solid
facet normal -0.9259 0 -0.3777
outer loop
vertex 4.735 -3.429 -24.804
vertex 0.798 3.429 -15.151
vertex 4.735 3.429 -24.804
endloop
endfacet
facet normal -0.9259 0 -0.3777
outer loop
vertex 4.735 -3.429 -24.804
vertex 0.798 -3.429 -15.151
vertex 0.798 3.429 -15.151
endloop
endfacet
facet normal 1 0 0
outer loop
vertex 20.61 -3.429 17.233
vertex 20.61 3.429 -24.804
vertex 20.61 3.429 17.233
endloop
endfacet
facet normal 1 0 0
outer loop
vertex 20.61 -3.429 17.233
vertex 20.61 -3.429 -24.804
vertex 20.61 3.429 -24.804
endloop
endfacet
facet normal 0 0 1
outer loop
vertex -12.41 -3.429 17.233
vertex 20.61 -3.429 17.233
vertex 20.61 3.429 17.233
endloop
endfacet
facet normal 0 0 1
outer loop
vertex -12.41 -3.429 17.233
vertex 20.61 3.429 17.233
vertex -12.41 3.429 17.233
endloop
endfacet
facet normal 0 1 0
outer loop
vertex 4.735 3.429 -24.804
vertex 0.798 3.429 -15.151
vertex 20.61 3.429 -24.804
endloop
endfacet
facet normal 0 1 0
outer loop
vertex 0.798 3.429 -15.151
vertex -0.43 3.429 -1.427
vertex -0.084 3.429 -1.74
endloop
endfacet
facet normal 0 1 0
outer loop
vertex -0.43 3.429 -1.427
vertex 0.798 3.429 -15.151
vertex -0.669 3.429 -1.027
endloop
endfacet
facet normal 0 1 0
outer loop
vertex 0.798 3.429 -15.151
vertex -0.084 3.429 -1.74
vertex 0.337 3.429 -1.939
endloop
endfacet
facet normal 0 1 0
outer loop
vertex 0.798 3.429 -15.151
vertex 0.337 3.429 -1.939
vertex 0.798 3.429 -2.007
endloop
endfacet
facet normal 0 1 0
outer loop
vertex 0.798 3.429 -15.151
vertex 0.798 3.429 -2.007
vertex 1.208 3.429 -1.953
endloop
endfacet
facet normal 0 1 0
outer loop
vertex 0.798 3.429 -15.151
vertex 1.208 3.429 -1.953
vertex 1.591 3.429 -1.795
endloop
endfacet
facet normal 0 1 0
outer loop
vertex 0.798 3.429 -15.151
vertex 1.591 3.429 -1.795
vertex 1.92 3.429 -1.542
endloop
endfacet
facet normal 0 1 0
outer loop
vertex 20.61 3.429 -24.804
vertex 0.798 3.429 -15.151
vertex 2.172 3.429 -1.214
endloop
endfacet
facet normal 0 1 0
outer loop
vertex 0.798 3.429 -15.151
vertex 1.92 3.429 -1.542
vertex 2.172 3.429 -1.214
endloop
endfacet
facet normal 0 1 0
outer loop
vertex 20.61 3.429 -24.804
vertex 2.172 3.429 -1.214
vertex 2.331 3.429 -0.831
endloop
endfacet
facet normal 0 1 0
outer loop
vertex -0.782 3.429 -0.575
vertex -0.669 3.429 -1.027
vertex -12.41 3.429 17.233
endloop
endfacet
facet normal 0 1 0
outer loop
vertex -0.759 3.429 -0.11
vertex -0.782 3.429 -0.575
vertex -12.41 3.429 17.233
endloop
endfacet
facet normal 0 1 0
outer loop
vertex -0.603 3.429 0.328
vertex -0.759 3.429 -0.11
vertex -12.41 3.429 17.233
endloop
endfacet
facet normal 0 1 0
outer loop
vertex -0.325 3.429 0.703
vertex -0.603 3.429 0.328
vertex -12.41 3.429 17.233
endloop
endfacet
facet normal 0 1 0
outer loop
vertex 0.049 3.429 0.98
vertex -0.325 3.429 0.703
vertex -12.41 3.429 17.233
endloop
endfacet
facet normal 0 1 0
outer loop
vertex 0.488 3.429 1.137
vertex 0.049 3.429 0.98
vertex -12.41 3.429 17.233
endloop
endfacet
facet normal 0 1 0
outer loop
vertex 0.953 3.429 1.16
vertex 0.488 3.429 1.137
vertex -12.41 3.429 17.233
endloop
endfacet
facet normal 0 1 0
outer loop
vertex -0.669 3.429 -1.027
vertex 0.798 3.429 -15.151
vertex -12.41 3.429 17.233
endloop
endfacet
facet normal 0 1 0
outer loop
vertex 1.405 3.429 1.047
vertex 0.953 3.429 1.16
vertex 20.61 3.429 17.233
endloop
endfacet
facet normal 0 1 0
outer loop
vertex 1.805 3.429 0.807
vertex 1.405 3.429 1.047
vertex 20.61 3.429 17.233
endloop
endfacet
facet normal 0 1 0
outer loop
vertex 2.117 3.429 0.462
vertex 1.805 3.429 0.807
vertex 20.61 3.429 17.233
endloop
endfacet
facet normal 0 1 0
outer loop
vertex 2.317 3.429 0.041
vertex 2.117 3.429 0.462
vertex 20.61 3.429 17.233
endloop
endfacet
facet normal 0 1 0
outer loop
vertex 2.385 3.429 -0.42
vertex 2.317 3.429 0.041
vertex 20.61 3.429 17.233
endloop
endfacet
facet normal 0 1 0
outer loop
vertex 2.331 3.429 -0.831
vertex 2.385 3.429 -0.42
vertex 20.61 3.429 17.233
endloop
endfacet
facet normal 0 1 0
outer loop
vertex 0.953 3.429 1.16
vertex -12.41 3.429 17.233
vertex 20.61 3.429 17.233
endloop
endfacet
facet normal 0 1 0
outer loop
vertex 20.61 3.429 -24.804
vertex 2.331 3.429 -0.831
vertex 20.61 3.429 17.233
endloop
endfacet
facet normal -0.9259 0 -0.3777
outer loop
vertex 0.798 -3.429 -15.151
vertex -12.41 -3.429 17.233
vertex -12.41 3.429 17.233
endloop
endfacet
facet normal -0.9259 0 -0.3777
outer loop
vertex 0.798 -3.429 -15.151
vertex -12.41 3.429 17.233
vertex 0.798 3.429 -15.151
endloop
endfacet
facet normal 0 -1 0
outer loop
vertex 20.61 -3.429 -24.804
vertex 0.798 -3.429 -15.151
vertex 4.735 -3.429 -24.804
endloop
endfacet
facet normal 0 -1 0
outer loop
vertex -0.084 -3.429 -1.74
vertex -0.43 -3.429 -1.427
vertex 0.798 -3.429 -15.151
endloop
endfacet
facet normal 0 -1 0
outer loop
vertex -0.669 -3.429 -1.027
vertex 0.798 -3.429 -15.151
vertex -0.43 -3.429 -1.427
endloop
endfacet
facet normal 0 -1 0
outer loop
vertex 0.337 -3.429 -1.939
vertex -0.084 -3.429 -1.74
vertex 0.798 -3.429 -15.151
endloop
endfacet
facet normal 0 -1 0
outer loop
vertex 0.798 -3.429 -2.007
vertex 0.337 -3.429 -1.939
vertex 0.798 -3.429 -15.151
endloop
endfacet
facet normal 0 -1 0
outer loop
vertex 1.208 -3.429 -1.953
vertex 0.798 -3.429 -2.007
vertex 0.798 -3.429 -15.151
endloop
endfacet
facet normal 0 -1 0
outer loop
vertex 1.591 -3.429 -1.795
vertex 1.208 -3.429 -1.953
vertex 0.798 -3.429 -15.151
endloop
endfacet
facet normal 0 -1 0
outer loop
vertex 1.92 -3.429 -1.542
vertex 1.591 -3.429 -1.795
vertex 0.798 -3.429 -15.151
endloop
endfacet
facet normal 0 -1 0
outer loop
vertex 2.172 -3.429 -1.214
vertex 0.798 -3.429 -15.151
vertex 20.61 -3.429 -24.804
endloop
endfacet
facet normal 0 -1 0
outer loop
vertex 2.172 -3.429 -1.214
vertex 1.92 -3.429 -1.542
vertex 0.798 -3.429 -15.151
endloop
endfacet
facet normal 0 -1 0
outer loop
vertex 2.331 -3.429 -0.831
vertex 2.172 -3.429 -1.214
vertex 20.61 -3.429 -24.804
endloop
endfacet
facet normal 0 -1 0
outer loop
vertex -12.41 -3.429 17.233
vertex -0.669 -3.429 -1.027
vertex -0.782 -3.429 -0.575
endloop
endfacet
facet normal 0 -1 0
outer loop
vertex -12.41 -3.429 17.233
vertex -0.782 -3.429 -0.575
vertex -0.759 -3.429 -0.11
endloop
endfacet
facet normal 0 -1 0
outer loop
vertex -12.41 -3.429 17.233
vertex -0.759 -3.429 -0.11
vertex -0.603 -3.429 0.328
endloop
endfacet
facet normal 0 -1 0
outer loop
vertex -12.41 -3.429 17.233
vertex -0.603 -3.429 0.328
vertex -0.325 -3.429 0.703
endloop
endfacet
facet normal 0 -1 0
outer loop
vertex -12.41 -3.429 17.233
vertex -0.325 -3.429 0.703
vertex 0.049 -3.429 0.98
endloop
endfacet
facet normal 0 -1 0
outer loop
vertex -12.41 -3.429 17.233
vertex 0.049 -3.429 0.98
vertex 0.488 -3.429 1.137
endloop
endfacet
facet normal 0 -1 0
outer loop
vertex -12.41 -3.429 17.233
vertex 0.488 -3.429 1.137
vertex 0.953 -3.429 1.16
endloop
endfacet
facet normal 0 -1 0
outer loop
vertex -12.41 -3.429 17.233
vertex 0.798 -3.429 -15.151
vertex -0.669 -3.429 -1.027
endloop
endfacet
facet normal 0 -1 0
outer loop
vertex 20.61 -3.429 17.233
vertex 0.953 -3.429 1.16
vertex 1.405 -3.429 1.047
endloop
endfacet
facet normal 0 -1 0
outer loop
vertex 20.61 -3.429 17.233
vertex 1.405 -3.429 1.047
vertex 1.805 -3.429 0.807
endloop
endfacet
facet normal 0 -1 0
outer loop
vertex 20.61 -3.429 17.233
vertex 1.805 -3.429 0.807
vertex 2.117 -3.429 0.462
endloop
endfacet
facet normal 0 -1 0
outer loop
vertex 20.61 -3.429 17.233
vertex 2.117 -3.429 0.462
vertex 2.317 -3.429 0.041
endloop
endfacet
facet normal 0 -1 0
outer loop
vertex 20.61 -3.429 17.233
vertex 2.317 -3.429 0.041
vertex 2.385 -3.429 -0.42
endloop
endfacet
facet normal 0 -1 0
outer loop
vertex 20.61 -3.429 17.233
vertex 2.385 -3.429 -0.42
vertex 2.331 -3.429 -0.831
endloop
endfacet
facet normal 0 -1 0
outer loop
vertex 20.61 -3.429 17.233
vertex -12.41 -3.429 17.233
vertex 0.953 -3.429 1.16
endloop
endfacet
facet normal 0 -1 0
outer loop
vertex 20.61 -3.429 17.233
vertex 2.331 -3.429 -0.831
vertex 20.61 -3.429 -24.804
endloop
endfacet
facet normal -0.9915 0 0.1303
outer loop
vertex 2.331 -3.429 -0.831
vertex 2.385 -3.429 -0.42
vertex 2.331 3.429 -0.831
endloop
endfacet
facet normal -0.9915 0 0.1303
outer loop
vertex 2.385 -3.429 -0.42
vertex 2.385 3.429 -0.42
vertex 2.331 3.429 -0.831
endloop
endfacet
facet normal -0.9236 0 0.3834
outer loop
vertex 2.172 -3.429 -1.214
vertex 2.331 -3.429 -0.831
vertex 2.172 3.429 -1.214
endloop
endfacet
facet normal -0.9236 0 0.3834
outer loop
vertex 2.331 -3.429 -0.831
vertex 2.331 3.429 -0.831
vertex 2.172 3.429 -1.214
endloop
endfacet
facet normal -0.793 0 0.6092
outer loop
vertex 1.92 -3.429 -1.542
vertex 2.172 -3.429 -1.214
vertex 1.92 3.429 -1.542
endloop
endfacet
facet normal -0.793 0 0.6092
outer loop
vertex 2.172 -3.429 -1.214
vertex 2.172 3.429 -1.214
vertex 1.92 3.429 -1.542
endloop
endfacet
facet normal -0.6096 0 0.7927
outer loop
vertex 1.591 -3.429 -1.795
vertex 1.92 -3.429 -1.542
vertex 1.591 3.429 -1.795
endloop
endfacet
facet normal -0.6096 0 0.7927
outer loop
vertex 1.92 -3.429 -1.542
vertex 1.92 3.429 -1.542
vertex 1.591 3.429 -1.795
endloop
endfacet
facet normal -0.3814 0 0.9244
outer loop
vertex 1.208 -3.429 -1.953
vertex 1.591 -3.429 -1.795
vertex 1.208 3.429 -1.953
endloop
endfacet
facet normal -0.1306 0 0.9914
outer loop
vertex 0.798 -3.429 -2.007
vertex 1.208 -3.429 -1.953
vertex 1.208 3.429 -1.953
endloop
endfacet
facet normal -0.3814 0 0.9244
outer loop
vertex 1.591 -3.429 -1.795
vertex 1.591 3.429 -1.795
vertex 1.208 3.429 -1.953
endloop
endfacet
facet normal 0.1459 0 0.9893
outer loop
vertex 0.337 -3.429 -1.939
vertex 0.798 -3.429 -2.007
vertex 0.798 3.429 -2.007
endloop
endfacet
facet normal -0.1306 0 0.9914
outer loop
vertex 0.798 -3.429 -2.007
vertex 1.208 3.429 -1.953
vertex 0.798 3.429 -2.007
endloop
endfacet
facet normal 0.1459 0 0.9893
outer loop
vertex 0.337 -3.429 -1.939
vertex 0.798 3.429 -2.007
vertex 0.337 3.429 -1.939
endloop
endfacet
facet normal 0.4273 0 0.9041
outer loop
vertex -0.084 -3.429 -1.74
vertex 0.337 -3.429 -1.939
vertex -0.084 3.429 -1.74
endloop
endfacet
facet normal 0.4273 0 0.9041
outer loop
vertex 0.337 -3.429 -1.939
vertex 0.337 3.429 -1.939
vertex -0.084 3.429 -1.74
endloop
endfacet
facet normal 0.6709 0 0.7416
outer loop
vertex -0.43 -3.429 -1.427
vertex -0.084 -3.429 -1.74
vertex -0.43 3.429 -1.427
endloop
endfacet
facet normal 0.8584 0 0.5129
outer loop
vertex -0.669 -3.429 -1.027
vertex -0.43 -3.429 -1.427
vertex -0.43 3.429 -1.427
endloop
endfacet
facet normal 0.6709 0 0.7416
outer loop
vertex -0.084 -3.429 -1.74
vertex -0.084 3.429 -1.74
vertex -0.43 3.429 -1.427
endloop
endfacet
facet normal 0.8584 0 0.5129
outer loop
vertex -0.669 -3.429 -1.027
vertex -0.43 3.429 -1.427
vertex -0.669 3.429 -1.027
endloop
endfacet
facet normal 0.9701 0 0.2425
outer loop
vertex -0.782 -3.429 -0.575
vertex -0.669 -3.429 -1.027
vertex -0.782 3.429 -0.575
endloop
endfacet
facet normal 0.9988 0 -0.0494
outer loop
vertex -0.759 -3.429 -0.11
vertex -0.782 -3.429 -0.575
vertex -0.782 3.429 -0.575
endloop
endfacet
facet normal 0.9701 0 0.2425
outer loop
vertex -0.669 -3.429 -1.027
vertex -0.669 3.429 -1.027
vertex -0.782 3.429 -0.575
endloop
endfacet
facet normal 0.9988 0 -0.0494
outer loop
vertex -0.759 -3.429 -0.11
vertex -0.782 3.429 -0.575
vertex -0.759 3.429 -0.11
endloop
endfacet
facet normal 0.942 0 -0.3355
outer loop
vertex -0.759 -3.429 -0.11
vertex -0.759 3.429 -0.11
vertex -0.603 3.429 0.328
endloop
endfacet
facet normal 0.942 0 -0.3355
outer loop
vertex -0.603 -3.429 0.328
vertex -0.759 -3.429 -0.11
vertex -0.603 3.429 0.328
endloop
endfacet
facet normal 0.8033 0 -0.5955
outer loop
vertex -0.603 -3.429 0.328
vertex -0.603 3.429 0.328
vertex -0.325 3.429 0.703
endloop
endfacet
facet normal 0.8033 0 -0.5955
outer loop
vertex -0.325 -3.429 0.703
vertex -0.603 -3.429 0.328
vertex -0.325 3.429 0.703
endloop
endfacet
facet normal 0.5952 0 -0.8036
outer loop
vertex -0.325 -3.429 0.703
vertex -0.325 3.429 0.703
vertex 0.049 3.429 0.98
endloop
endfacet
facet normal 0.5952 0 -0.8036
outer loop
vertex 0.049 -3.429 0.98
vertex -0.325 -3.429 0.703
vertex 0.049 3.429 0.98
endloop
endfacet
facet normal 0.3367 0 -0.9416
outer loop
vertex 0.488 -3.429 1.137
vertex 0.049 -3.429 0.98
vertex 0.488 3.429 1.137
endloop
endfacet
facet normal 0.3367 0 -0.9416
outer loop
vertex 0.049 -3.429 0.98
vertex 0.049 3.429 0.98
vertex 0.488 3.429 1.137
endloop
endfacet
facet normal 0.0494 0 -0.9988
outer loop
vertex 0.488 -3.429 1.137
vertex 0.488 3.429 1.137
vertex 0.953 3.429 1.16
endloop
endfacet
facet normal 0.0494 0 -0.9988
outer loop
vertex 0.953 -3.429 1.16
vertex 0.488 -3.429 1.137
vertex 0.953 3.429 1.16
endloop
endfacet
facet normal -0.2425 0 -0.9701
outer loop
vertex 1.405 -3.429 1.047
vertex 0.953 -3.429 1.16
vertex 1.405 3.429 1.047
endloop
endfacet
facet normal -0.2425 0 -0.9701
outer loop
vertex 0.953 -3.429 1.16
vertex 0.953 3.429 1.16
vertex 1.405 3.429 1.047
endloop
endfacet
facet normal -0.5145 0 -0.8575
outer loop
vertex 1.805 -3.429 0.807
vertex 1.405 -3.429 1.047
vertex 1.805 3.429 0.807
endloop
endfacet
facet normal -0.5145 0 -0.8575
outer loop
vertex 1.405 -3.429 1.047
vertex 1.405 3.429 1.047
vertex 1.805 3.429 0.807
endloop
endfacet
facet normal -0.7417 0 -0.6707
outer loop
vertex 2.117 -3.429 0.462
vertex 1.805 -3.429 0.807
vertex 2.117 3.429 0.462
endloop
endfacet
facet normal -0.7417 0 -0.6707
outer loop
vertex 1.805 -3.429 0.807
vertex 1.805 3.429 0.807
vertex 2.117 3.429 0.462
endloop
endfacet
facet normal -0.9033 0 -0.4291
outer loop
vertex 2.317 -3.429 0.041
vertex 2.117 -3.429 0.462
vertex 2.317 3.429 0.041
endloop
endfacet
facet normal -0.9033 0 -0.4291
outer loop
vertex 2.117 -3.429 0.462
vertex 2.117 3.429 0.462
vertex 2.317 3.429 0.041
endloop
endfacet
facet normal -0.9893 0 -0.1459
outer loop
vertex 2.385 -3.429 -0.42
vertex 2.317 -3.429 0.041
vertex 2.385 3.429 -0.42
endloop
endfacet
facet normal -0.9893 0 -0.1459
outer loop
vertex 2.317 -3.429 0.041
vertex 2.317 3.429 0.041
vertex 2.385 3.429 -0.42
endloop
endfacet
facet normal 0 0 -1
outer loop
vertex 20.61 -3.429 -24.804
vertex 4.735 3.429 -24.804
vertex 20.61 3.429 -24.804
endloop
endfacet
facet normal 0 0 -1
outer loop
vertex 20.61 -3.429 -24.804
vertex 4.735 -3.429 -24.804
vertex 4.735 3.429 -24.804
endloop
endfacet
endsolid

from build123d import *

# Parameters (mm, degrees)
F1_DEPTH = 3.429


with BuildPart() as f1:
    # F0 (on Front) → F1 (new body, symmetric)
    with BuildSketch(Plane.XZ):
        Polygon((20.6095185396, -24.8038658976), (20.6095185396, 17.2331341024), (-12.4104814604, 17.2331341024), (0.7975185396, -15.1509251569), (4.7345185396, -24.8038658976), align=None)
        with BuildLine():
            ThreePointArc((2.3850185396, -0.4198658976), (1.9200505547, -1.5423979128), (0.7975185396, -2.0073658976))
            ThreePointArc((0.7975185396, -2.0073658976), (-0.3250134755, 0.7026661175), (2.3850185396, -0.4198658976))
        make_face(mode=Mode.SUBTRACT)
    extrude(amount=F1_DEPTH, both=True)


solid = f1.part
